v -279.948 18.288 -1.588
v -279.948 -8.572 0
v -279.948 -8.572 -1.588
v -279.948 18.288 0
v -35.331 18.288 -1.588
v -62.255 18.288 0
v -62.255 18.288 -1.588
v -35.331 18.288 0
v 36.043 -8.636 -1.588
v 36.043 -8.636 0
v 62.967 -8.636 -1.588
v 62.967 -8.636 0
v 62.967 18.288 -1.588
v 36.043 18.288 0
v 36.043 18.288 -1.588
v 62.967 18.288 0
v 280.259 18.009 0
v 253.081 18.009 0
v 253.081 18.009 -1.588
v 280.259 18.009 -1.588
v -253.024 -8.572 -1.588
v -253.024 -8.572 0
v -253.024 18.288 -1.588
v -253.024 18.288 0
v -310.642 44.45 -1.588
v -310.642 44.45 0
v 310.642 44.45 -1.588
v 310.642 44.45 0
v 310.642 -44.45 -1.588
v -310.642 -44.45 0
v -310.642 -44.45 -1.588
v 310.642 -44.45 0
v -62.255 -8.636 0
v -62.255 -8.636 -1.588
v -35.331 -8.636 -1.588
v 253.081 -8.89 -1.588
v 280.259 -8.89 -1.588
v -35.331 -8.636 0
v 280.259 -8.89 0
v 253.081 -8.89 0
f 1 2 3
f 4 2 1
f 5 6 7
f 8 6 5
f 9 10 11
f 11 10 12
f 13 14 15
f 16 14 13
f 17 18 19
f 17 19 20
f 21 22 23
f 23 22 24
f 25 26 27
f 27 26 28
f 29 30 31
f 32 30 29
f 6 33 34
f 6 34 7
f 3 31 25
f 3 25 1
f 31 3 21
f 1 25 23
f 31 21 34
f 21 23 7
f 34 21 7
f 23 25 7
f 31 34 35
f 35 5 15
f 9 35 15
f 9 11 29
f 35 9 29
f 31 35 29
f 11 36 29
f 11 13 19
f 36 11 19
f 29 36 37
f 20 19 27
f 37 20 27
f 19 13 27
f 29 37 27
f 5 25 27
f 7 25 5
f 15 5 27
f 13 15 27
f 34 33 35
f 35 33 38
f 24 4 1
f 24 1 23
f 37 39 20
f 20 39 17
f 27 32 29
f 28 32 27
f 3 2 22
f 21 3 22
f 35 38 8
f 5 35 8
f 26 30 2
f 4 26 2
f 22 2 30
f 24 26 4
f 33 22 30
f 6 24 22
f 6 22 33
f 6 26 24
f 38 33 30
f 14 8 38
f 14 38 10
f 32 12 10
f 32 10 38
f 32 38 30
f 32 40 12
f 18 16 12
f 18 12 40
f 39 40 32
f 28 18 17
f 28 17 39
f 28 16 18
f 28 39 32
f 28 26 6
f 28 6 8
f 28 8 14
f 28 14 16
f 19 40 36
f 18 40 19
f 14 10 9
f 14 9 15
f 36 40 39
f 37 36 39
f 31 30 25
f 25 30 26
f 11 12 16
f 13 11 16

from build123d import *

# Parameters (mm, degrees)
SKETCH2_W          = 621.284
SKETCH2_H          = 88.9
BASE_FLANGE1_DEPTH = 1.5875
SKETCH7_W          = 26.924
SKETCH7_H          = 26.8605
SKETCH7_W_2        = 27.178
SKETCH7_H_2        = 26.8986
SKETCH7_H_3        = 26.924
CUT_EXTRUDE1_DEPTH = 314.81009356


# Sheet-metal steps are written as plain solids
with BuildPart() as part:
    # Sketch2 → Base-Flange1 (new body)
    with BuildSketch(Plane.XY):
        Rectangle(SKETCH2_W, SKETCH2_H)
    extrude(amount=-BASE_FLANGE1_DEPTH)

    # Sketch7 → Cut-Extrude1 (cut, through all)
    with BuildSketch(Plane.XY):
        with Locations((-266.48580561, 4.85775)):
            Rectangle(SKETCH7_W, SKETCH7_H)
        with Locations((266.66976638, 4.5593)):
            Rectangle(SKETCH7_W_2, SKETCH7_H_2)
        with Locations((-48.7934, 4.826)):
            Rectangle(SKETCH7_W, SKETCH7_H_3)
        with Locations((49.5046, 4.826)):
            Rectangle(SKETCH7_W, SKETCH7_H_3)
    extrude(amount=-CUT_EXTRUDE1_DEPTH, mode=Mode.SUBTRACT)


solid = part.part
